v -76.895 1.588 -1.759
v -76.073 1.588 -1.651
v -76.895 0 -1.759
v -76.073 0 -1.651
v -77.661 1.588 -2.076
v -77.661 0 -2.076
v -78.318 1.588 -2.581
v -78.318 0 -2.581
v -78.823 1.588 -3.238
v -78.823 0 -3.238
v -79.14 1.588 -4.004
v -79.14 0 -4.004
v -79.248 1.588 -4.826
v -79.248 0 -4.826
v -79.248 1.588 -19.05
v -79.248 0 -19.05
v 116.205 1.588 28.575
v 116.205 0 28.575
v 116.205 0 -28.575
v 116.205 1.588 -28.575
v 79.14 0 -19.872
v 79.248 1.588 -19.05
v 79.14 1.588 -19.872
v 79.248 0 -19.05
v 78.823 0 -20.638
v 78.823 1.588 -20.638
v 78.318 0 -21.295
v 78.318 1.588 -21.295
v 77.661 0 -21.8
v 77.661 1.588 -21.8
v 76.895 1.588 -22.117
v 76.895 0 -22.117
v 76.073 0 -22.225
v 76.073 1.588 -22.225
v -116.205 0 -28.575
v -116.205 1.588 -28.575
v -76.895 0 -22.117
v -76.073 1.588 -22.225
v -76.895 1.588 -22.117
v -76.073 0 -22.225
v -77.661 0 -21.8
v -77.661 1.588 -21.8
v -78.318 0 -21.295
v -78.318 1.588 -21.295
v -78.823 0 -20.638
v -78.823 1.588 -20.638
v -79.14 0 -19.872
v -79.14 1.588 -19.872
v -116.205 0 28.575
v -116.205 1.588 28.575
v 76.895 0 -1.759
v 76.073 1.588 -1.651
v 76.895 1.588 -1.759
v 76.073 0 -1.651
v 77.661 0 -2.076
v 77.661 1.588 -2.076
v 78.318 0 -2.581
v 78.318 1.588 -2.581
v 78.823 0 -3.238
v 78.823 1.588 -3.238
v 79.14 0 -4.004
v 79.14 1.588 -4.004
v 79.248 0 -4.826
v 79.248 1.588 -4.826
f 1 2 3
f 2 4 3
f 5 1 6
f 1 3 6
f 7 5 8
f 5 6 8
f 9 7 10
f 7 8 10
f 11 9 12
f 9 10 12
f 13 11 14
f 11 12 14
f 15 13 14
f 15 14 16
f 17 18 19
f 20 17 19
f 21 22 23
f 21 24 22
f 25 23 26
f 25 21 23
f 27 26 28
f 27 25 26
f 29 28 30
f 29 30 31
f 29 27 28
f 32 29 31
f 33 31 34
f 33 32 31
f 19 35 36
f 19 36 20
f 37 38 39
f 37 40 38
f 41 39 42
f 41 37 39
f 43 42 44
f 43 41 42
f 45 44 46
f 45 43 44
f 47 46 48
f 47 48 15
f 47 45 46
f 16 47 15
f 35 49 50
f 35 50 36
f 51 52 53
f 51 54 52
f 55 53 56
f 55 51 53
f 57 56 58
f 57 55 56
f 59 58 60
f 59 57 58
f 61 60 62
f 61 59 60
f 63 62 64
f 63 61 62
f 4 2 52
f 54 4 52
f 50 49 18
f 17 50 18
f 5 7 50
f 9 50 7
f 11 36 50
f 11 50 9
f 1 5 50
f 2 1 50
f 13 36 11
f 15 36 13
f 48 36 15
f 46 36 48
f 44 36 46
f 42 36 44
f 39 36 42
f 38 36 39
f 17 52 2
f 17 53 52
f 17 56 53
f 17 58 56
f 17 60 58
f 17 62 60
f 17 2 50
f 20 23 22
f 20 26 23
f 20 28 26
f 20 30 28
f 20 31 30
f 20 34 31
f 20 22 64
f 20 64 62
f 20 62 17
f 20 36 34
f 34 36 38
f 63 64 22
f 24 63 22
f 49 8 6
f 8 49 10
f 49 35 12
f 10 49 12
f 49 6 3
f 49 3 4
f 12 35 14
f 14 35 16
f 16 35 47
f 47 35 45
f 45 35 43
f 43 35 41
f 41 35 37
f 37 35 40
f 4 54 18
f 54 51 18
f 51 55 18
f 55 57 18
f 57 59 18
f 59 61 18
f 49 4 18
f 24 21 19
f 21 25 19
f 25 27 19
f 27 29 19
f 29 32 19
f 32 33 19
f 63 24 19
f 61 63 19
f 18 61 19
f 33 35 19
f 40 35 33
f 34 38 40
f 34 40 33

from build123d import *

# Parameters (mm, degrees)
SKETCH1_W           = 232.41
SKETCH1_H           = 57.15
BOSS_EXTRUDE1_DEPTH = 1.5875
SKETCH2_W           = 158.496
SKETCH2_H           = 20.574
CUT_EXTRUDE1_DEPTH  = 2.5875
FILLET1_R           = 3.175


with BuildPart() as part:
    # Sketch1 → Boss-Extrude1 (new body)
    with BuildSketch(Plane(origin=(0, 0, 0), x_dir=(1, 0, 0), z_dir=(0, 1, 0))):
        Rectangle(SKETCH1_W, SKETCH1_H)
    extrude(amount=BOSS_EXTRUDE1_DEPTH)

    # Sketch2 → Cut-Extrude1 (cut, through all)
    with BuildSketch(Plane(origin=(0, 1.5875, 0), x_dir=(1, 0, 0), z_dir=(0, 1, 0))):
        with Locations((0, 11.938)):
            Rectangle(SKETCH2_W, SKETCH2_H)
    extrude(amount=-CUT_EXTRUDE1_DEPTH, mode=Mode.SUBTRACT)

    # Fillet1
    fillet1_edges = [part.edges().sort_by_distance(p)[0] for p in [
        (-79.248, 0.79375, -1.651),
        (-79.248, 0.79375, -22.225),
        (79.248, 0.79375, -22.225),
        (79.248, 0.79375, -1.651),
    ]]
    fillet(fillet1_edges, radius=FILLET1_R)


solid = part.part
